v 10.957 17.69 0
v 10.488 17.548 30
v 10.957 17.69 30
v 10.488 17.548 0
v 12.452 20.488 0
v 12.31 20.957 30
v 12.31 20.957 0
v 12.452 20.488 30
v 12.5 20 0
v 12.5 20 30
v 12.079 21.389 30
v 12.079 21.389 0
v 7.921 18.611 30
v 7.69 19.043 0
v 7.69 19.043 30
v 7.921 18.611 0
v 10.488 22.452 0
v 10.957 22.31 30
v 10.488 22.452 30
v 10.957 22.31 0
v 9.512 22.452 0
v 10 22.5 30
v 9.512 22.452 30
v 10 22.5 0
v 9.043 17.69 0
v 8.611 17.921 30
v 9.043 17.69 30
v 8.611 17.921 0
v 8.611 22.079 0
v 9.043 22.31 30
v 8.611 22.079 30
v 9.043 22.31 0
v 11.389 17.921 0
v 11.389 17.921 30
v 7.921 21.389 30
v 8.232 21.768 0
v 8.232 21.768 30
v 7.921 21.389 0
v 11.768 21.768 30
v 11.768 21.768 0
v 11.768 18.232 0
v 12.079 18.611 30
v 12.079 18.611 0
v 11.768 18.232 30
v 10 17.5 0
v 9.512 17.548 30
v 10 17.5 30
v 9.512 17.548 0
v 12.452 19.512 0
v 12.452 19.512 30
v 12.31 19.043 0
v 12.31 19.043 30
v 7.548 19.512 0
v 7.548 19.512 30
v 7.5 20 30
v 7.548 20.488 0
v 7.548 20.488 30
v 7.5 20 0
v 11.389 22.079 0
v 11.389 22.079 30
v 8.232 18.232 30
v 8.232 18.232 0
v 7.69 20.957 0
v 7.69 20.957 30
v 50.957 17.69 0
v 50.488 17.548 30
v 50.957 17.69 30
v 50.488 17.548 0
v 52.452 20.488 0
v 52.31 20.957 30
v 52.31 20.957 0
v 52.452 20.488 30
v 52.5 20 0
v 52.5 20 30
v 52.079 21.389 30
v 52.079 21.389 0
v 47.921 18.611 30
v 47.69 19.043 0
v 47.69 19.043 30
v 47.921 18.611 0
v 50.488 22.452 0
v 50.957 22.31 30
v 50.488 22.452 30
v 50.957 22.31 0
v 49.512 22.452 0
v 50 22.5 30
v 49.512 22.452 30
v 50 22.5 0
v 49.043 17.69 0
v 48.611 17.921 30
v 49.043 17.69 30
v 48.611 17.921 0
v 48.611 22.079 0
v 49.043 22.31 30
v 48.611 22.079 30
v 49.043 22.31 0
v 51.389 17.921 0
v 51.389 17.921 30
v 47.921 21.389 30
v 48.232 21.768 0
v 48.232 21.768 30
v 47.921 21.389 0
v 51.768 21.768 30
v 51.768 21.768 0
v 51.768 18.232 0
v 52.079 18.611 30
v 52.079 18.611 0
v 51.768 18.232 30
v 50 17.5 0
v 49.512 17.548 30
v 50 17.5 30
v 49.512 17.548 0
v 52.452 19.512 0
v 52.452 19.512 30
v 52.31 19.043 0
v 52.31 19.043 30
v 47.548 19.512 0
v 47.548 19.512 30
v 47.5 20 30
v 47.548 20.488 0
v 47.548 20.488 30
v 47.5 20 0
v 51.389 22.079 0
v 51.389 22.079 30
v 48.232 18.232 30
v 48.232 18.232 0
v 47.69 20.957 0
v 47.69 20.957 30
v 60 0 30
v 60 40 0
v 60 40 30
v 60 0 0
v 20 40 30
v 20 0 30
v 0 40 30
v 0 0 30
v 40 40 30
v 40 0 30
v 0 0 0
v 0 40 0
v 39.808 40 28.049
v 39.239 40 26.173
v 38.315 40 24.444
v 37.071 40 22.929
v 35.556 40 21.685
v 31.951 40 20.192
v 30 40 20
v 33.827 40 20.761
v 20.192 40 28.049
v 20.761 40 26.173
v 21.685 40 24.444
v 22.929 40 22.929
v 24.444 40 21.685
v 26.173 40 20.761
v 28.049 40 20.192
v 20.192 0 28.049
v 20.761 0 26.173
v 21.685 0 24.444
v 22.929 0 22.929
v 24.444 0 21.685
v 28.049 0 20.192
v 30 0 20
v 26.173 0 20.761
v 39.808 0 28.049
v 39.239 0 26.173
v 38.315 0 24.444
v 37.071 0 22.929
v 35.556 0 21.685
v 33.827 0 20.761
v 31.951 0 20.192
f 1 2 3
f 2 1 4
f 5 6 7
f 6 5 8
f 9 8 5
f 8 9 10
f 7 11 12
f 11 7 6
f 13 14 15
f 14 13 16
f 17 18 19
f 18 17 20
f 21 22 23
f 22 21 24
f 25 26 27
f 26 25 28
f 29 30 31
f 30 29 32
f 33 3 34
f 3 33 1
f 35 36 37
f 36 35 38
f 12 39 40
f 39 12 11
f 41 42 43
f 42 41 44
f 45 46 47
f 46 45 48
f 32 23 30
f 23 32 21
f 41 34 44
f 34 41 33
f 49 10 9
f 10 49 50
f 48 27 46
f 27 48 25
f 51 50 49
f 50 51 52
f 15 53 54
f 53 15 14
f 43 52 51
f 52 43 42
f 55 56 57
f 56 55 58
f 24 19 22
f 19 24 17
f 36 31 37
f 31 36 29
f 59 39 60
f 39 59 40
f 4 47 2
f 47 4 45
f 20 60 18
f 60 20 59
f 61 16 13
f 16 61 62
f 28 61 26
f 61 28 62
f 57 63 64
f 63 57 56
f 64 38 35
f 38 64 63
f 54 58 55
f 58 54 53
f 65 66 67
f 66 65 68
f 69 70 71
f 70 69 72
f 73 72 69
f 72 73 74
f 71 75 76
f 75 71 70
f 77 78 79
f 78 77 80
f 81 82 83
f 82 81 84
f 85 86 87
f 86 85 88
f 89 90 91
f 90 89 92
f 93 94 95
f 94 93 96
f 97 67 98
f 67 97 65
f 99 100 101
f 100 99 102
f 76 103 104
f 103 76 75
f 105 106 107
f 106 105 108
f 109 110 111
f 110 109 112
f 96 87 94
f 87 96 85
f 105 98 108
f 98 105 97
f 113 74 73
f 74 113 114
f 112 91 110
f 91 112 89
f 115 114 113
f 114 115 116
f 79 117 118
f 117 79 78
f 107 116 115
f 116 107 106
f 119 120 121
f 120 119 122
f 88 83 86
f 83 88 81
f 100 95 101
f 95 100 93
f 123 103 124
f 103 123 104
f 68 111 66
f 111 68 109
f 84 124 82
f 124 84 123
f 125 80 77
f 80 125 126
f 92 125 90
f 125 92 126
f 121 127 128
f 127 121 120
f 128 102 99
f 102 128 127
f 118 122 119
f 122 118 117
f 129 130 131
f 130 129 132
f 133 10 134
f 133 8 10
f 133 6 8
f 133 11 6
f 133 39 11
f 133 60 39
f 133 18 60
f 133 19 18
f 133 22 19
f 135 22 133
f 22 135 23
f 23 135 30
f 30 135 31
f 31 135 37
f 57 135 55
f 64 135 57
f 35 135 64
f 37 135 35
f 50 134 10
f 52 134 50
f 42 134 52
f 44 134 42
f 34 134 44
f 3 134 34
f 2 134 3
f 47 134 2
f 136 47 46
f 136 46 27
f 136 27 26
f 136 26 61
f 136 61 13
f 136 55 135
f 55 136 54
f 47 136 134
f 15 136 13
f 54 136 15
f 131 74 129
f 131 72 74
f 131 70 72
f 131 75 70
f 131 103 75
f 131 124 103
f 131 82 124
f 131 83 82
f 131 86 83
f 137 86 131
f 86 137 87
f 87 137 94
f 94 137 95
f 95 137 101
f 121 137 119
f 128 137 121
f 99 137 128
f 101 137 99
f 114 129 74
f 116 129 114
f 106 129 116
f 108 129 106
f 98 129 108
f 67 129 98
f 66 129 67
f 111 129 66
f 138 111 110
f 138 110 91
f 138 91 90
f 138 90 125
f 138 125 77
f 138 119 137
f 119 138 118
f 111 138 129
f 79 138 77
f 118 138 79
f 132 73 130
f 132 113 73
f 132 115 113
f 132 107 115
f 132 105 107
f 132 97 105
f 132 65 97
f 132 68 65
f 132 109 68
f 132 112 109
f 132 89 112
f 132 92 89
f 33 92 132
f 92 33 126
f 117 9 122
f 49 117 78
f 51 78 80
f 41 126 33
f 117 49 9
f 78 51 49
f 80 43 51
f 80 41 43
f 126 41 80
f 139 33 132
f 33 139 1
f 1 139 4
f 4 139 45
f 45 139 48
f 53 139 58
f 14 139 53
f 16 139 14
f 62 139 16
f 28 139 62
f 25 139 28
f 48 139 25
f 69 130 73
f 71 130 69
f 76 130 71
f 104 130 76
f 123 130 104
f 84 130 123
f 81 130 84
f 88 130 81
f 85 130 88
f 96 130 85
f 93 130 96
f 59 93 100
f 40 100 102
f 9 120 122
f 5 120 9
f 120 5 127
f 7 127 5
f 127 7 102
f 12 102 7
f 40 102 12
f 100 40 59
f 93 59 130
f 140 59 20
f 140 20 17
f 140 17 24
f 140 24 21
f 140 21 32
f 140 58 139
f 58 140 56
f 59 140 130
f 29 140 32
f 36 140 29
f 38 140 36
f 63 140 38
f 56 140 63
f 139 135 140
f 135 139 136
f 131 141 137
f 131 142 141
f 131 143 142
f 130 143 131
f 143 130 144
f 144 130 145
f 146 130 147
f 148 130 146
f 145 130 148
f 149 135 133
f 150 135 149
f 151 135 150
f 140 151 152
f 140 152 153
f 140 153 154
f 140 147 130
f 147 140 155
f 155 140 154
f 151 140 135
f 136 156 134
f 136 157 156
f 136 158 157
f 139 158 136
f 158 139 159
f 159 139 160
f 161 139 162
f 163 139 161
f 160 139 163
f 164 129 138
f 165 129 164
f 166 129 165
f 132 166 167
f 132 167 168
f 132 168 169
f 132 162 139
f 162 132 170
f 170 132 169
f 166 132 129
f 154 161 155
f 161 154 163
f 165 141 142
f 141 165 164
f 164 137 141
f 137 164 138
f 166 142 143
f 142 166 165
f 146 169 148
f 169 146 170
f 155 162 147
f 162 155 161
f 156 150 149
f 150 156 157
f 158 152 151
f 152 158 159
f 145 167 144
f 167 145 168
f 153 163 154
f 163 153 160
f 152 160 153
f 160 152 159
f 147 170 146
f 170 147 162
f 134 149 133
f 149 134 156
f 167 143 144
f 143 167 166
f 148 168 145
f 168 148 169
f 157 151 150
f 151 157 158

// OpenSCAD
$fn = 32;

// ----------------------------------------------------------------------
// Saddle clamp: plain shaft clamp
// ----------------------------------------------------------------------

// --- parameters (mm) ---
blk_l = 60;               // block length, X
blk_w = 40;               // block width, Y
blk_h = 30;               // block height
clamp_r = 10;             // shaft groove radius
hole_r = 2.5;             // bolt hole radius
hole_m = 10;              // bolt hole margin from the ends
fit_tol = 0.02;           // tolerance for press fits, mm
free_tol = 0.2;           // tolerance for clearance fits, mm

saw_depth = clamp_r + 3;  // saw kerf depth

difference() {
  cube([blk_l, blk_w, blk_h]);
  translate([blk_l / 2, -1, blk_h])
    rotate([-90, 0, 0])
      cylinder(h = blk_w + 2, r = clamp_r);
  for (sx = [0, 1])
    translate([sx ? blk_l - hole_m : hole_m, blk_w / 2, -1])
      cylinder(r = hole_r, h = blk_h + 2);
}
